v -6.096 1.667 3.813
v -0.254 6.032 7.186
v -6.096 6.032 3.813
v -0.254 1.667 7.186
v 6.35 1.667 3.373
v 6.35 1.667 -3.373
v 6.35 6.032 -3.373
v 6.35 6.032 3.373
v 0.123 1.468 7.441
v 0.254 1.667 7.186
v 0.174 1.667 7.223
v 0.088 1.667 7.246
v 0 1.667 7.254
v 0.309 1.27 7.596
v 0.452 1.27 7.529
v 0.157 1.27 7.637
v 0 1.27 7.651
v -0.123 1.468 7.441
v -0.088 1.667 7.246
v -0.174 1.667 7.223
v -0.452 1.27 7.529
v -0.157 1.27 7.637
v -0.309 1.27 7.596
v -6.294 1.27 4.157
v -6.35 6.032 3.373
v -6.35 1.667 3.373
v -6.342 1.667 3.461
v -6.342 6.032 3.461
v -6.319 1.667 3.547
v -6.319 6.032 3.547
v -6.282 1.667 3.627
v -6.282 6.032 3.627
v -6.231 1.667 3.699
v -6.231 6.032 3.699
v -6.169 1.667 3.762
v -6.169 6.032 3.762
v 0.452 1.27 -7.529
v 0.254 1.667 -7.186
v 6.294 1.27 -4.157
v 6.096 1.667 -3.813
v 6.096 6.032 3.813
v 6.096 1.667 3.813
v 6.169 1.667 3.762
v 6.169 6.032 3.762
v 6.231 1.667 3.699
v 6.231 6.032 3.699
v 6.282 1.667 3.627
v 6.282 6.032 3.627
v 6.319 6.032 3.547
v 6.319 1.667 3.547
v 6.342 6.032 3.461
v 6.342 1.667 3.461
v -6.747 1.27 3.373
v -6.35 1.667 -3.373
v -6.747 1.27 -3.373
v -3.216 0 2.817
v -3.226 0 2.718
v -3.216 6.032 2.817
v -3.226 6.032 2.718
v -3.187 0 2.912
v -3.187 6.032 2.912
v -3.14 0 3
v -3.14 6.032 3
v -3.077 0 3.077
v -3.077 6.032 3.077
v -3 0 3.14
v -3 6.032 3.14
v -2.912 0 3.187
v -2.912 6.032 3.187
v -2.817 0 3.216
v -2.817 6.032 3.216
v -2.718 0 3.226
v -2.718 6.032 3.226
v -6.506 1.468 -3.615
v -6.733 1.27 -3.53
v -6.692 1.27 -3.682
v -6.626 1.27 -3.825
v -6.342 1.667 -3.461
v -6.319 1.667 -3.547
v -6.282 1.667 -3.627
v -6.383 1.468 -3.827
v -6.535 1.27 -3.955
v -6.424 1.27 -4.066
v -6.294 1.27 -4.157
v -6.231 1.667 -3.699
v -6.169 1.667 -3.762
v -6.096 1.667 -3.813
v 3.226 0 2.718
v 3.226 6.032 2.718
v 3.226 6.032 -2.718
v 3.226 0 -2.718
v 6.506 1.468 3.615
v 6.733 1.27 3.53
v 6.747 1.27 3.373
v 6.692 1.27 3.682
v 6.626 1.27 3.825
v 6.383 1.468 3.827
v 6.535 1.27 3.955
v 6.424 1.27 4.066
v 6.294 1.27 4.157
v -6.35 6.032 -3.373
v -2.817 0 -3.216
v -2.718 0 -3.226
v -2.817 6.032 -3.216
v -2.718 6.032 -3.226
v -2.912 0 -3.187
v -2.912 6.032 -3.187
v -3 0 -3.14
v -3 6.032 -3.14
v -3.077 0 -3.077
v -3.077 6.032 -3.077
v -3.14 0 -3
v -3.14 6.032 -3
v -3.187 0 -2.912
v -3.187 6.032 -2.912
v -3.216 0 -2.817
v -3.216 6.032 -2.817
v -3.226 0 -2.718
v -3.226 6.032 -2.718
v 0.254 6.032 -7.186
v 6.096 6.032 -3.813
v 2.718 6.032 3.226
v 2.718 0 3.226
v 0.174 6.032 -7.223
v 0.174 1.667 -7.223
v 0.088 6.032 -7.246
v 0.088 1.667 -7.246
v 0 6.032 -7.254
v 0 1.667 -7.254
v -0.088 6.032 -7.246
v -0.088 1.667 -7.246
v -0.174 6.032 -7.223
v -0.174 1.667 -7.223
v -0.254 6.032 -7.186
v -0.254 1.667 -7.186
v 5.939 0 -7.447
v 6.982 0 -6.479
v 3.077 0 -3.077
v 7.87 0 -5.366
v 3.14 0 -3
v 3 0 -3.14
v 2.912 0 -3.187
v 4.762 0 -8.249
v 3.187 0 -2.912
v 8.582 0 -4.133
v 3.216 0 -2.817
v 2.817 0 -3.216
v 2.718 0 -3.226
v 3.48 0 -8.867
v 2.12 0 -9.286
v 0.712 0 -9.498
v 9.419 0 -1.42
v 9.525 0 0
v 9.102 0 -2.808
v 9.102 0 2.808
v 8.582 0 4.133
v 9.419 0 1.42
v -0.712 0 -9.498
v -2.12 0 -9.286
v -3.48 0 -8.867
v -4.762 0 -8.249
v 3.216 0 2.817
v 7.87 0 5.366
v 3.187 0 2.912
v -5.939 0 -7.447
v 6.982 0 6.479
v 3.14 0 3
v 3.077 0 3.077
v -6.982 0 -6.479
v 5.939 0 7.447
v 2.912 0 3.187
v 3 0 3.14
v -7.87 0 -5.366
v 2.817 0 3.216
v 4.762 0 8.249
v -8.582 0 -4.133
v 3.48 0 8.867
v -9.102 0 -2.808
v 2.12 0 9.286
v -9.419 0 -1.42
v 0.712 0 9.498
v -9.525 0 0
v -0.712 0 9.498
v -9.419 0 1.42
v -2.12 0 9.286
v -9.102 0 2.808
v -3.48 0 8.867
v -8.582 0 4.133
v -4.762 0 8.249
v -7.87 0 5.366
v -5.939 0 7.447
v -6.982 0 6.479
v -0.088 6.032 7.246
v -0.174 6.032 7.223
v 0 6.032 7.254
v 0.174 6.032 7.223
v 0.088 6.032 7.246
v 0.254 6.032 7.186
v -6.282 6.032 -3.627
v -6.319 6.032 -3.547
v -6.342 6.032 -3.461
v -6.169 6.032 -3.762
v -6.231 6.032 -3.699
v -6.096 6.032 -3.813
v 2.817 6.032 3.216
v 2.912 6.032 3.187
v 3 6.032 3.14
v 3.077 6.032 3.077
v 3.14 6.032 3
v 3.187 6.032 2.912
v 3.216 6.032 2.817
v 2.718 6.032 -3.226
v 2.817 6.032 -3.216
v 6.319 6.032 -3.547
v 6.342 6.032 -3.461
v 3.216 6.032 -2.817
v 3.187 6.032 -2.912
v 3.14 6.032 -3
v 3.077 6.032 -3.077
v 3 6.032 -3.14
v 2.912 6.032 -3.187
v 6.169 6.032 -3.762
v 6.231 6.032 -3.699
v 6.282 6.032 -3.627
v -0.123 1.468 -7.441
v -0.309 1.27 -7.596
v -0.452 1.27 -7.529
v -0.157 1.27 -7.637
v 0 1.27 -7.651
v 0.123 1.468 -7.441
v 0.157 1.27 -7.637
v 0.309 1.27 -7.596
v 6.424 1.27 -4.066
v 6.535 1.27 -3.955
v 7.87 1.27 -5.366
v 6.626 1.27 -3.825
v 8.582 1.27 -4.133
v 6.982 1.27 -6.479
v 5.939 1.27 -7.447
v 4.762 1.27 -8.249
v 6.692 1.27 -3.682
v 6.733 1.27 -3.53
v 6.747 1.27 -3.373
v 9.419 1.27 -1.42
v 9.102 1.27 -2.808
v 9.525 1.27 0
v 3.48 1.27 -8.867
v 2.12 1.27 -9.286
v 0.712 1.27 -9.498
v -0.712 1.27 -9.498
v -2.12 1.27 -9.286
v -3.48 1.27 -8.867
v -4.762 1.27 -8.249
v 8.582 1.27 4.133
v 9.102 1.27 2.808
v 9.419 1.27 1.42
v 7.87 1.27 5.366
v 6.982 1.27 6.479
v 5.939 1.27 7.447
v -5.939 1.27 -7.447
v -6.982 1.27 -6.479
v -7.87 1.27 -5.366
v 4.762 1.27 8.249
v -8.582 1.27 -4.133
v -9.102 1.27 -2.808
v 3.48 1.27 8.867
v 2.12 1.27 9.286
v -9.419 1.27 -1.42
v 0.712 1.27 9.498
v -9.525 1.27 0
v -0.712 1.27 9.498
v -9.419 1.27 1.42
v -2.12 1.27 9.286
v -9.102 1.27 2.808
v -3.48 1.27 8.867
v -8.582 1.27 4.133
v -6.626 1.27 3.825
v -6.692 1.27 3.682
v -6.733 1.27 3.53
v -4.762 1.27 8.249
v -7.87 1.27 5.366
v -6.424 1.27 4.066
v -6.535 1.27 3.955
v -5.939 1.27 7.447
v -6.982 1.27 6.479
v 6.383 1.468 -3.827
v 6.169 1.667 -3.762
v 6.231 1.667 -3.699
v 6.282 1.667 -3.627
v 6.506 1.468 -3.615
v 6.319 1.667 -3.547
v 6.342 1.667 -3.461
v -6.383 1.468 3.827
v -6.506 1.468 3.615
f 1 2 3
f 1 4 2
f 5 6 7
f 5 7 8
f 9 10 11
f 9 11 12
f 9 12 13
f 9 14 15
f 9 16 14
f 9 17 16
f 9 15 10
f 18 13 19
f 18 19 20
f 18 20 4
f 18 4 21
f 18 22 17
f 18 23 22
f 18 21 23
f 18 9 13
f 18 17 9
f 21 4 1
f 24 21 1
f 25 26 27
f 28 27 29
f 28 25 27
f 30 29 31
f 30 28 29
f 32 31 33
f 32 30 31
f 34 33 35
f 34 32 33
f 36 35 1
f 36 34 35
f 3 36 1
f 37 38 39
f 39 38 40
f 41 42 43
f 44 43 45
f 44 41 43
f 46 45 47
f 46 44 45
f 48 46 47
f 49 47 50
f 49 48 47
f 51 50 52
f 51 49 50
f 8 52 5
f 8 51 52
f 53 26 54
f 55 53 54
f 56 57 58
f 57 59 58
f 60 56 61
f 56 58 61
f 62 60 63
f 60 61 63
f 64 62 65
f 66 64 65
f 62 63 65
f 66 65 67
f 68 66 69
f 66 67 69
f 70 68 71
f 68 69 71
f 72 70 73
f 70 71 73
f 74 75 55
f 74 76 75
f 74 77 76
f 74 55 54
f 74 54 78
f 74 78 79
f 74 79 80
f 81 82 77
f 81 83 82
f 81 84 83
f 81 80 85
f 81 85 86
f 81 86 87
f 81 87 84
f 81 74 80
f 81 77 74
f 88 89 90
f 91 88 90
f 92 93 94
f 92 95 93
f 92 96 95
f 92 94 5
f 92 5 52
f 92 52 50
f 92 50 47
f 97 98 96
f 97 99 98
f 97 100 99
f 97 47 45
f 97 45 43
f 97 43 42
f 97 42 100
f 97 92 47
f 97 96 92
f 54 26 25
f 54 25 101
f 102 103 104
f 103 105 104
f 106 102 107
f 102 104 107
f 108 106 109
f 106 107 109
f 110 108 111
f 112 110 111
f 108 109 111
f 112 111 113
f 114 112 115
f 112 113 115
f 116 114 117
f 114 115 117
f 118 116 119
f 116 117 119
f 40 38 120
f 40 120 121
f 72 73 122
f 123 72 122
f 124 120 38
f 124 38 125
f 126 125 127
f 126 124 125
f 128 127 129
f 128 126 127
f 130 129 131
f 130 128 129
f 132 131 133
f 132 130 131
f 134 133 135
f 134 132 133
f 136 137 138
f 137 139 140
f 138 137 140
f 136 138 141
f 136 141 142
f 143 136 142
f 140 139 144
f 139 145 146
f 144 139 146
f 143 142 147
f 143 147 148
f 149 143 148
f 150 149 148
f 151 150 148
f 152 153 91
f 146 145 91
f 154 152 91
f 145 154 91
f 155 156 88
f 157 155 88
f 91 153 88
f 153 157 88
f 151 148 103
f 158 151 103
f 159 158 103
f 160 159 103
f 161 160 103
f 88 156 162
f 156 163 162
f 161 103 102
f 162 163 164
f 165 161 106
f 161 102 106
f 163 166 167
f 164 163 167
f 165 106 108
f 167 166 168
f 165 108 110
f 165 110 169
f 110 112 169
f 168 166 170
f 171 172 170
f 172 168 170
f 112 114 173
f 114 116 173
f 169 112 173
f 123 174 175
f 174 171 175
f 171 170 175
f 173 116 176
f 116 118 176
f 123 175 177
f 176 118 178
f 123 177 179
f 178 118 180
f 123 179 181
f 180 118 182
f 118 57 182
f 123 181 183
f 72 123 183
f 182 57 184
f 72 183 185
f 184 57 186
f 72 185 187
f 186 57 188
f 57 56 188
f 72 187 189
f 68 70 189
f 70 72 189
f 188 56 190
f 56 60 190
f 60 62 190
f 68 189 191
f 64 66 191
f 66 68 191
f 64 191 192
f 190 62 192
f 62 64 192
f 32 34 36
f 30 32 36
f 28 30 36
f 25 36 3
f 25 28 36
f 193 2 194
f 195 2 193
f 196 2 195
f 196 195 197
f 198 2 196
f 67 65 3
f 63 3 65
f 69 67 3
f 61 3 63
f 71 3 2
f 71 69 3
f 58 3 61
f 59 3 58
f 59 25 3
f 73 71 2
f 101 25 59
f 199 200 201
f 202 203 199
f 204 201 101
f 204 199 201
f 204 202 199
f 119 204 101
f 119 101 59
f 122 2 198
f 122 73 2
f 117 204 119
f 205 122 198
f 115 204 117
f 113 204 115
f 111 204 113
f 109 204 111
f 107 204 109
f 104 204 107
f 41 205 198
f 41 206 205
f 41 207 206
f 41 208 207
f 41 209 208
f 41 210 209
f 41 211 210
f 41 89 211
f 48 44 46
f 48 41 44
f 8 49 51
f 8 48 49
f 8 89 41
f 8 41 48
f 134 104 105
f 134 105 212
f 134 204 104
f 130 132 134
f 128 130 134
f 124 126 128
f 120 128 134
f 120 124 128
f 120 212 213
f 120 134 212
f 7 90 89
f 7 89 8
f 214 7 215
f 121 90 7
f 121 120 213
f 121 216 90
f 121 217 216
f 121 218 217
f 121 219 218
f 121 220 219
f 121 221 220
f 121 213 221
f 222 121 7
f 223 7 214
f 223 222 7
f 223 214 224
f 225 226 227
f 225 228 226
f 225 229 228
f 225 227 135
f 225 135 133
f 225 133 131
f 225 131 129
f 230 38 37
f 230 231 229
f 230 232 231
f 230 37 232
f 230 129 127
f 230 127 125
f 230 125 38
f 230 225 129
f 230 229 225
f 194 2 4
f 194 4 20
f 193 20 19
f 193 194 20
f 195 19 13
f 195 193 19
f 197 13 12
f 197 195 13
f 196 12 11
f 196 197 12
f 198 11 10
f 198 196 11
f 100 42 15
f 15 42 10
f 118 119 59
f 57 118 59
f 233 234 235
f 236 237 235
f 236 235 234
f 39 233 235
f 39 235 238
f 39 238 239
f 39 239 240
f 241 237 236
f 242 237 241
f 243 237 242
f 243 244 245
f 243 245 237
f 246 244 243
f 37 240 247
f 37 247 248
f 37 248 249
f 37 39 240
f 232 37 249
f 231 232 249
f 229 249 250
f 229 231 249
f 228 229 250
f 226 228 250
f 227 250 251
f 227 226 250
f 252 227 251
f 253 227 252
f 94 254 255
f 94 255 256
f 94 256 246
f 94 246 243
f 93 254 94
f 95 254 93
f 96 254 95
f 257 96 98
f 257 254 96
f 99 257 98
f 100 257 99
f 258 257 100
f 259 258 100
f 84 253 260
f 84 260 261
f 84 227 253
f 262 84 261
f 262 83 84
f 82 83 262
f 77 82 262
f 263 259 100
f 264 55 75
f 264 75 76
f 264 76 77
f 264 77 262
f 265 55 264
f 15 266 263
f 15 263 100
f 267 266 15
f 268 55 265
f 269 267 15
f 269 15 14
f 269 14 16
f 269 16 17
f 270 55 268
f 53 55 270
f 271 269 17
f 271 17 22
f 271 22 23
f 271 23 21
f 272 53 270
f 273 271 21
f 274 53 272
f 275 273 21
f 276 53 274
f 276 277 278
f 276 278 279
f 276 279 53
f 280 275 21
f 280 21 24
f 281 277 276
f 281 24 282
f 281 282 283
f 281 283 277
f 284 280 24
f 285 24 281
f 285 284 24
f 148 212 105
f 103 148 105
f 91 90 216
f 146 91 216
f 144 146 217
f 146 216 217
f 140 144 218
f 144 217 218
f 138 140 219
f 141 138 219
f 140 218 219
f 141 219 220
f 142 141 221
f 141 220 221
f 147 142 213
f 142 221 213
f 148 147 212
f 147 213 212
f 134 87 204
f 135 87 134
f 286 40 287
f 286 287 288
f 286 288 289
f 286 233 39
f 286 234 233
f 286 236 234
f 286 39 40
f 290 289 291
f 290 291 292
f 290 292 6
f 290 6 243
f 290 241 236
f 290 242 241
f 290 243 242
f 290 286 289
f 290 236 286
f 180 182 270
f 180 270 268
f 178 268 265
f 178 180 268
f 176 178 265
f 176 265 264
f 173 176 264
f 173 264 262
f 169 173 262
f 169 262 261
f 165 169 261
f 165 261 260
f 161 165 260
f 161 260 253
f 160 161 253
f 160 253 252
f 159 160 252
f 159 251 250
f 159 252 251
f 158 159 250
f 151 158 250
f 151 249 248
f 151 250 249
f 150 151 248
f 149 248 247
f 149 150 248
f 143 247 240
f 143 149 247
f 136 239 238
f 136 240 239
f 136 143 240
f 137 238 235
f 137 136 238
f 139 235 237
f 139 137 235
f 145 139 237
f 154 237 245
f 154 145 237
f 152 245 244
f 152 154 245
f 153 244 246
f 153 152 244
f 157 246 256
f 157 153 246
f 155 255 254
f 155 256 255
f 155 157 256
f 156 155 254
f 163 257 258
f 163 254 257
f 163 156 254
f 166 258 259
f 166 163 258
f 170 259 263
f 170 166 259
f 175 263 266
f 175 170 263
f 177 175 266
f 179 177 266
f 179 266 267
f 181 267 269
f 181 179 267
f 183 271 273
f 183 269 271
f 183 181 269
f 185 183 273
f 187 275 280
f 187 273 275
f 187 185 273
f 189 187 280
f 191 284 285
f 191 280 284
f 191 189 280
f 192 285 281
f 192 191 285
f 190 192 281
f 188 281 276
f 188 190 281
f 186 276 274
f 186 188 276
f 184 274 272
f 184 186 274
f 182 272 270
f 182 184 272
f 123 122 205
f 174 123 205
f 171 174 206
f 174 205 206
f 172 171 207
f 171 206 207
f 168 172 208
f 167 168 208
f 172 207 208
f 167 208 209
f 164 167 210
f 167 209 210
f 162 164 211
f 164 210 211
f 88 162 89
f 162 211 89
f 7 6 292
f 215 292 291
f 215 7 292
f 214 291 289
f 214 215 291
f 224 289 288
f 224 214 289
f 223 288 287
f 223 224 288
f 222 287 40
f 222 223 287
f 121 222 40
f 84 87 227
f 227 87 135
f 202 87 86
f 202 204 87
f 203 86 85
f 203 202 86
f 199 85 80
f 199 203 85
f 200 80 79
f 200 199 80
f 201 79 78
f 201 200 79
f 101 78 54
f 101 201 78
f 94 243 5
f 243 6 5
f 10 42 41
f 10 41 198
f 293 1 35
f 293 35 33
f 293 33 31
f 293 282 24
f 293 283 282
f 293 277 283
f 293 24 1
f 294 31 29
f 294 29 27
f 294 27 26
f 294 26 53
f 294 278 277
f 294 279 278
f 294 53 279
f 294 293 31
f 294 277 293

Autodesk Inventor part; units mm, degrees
ref_plane "YZ Plane" through (0, 0, 0) normal (1, 0, 0) x (0, 1, 0)
ref_plane "XZ Plane" through (0, 0, 0) normal (0, 1, 0) x (-1, 0, 0)
ref_plane "XY Plane" through (0, 0, 0) normal (0, 0, 1) x (1, 0, 0)
sketch "Sketch1" plane through (0, 0, 0) normal (0, 1, 0) x (-1, 0, 0)
  circle A0 centre (0, 0) radius 9.525
  dimension "d0" = 19.05
extrude "Extrusion1" add sketch "Sketch1" along normal blind 1.27
sketch "Sketch2" plane through (0, 1.27, 0) normal (0, 1, 0) x (1, 0, 0)
  line L0 (6.35, -3.6662) -> (0, -7.3323)
  line L1 (0, -7.3323) -> (-6.35, -3.6662)
  line L2 (-6.35, -3.6662) -> (-6.35, 3.6662)
  line L3 (-6.35, 3.6662) -> (0, 7.3323)
  line L4 (0, 7.3323) -> (6.35, 3.6662)
  line L5 (6.35, 3.6662) -> (6.35, -3.6662)
  point P0 (0, 0)
  point P1 (0, 0)
  dimension "d4" = 12.7
extrude "Extrusion2" add sketch "Sketch2" along normal blind 4.7625
fillet "Fillet1" radius 0.508 6 edges at (6.35, 3.6513, 3.6662) (6.35, 3.6513, -3.6662) (0, 3.6513, -7.3323) (0, 3.6513, 7.3323) (-6.35, 3.6513, 3.6662) (-6.35, 3.6513, -3.6662)
sketch "Sketch3" plane through (0, 6.0325, 0) normal (0, 1, 0) x (1, 0, 0)
  line L0 (-2.7178, -3.2258) -> (2.7178, -3.2258)
  line L1 (3.2258, -2.7178) -> (3.2258, 2.7178)
  line L2 (2.7178, 3.2258) -> (-2.7178, 3.2258)
  line L3 (-3.2258, 2.7178) -> (-3.2258, -2.7178)
  line L4 (-3.2258, -3.2258) -> (3.2258, 3.2258) construction
  line L5 (3.2258, -3.2258) -> (-3.2258, 3.2258) construction
  arc A0 (-3.2258, -2.7178) -> (-2.7178, -3.2258) centre (-2.7178, -2.7178) ccw
  arc A1 (2.7178, -3.2258) -> (3.2258, -2.7178) centre (2.7178, -2.7178) ccw
  arc A2 (3.2258, 2.7178) -> (2.7178, 3.2258) centre (2.7178, 2.7178) ccw
  arc A3 (-2.7178, 3.2258) -> (-3.2258, 2.7178) centre (-2.7178, 2.7178) ccw
  point P0 (0, 0)
  dimension "d8" = 6.4516
  dimension "d9" = 0.508
extrude "Extrusion3" cut sketch "Sketch3" against normal through all
chamfer "Chamfer1" distance 0.3969 angle 45 12 edges at (3.175, 1.27, -5.4993) (6.2819, 1.27, -3.6269) (6.35, 1.27, 0) (6.2819, 1.27, 3.6269) (3.175, 1.27, 5.4993) (0, 1.27, 7.2538) (-3.175, 1.27, 5.4993) (-6.2819, 1.27, 3.6269) (-6.35, 1.27, 0) (-6.2819, 1.27, -3.6269) (-3.175, 1.27, -5.4993) (0, 1.27, -7.2538)
properties part number "insert" material "Acetal Resin, Black"
